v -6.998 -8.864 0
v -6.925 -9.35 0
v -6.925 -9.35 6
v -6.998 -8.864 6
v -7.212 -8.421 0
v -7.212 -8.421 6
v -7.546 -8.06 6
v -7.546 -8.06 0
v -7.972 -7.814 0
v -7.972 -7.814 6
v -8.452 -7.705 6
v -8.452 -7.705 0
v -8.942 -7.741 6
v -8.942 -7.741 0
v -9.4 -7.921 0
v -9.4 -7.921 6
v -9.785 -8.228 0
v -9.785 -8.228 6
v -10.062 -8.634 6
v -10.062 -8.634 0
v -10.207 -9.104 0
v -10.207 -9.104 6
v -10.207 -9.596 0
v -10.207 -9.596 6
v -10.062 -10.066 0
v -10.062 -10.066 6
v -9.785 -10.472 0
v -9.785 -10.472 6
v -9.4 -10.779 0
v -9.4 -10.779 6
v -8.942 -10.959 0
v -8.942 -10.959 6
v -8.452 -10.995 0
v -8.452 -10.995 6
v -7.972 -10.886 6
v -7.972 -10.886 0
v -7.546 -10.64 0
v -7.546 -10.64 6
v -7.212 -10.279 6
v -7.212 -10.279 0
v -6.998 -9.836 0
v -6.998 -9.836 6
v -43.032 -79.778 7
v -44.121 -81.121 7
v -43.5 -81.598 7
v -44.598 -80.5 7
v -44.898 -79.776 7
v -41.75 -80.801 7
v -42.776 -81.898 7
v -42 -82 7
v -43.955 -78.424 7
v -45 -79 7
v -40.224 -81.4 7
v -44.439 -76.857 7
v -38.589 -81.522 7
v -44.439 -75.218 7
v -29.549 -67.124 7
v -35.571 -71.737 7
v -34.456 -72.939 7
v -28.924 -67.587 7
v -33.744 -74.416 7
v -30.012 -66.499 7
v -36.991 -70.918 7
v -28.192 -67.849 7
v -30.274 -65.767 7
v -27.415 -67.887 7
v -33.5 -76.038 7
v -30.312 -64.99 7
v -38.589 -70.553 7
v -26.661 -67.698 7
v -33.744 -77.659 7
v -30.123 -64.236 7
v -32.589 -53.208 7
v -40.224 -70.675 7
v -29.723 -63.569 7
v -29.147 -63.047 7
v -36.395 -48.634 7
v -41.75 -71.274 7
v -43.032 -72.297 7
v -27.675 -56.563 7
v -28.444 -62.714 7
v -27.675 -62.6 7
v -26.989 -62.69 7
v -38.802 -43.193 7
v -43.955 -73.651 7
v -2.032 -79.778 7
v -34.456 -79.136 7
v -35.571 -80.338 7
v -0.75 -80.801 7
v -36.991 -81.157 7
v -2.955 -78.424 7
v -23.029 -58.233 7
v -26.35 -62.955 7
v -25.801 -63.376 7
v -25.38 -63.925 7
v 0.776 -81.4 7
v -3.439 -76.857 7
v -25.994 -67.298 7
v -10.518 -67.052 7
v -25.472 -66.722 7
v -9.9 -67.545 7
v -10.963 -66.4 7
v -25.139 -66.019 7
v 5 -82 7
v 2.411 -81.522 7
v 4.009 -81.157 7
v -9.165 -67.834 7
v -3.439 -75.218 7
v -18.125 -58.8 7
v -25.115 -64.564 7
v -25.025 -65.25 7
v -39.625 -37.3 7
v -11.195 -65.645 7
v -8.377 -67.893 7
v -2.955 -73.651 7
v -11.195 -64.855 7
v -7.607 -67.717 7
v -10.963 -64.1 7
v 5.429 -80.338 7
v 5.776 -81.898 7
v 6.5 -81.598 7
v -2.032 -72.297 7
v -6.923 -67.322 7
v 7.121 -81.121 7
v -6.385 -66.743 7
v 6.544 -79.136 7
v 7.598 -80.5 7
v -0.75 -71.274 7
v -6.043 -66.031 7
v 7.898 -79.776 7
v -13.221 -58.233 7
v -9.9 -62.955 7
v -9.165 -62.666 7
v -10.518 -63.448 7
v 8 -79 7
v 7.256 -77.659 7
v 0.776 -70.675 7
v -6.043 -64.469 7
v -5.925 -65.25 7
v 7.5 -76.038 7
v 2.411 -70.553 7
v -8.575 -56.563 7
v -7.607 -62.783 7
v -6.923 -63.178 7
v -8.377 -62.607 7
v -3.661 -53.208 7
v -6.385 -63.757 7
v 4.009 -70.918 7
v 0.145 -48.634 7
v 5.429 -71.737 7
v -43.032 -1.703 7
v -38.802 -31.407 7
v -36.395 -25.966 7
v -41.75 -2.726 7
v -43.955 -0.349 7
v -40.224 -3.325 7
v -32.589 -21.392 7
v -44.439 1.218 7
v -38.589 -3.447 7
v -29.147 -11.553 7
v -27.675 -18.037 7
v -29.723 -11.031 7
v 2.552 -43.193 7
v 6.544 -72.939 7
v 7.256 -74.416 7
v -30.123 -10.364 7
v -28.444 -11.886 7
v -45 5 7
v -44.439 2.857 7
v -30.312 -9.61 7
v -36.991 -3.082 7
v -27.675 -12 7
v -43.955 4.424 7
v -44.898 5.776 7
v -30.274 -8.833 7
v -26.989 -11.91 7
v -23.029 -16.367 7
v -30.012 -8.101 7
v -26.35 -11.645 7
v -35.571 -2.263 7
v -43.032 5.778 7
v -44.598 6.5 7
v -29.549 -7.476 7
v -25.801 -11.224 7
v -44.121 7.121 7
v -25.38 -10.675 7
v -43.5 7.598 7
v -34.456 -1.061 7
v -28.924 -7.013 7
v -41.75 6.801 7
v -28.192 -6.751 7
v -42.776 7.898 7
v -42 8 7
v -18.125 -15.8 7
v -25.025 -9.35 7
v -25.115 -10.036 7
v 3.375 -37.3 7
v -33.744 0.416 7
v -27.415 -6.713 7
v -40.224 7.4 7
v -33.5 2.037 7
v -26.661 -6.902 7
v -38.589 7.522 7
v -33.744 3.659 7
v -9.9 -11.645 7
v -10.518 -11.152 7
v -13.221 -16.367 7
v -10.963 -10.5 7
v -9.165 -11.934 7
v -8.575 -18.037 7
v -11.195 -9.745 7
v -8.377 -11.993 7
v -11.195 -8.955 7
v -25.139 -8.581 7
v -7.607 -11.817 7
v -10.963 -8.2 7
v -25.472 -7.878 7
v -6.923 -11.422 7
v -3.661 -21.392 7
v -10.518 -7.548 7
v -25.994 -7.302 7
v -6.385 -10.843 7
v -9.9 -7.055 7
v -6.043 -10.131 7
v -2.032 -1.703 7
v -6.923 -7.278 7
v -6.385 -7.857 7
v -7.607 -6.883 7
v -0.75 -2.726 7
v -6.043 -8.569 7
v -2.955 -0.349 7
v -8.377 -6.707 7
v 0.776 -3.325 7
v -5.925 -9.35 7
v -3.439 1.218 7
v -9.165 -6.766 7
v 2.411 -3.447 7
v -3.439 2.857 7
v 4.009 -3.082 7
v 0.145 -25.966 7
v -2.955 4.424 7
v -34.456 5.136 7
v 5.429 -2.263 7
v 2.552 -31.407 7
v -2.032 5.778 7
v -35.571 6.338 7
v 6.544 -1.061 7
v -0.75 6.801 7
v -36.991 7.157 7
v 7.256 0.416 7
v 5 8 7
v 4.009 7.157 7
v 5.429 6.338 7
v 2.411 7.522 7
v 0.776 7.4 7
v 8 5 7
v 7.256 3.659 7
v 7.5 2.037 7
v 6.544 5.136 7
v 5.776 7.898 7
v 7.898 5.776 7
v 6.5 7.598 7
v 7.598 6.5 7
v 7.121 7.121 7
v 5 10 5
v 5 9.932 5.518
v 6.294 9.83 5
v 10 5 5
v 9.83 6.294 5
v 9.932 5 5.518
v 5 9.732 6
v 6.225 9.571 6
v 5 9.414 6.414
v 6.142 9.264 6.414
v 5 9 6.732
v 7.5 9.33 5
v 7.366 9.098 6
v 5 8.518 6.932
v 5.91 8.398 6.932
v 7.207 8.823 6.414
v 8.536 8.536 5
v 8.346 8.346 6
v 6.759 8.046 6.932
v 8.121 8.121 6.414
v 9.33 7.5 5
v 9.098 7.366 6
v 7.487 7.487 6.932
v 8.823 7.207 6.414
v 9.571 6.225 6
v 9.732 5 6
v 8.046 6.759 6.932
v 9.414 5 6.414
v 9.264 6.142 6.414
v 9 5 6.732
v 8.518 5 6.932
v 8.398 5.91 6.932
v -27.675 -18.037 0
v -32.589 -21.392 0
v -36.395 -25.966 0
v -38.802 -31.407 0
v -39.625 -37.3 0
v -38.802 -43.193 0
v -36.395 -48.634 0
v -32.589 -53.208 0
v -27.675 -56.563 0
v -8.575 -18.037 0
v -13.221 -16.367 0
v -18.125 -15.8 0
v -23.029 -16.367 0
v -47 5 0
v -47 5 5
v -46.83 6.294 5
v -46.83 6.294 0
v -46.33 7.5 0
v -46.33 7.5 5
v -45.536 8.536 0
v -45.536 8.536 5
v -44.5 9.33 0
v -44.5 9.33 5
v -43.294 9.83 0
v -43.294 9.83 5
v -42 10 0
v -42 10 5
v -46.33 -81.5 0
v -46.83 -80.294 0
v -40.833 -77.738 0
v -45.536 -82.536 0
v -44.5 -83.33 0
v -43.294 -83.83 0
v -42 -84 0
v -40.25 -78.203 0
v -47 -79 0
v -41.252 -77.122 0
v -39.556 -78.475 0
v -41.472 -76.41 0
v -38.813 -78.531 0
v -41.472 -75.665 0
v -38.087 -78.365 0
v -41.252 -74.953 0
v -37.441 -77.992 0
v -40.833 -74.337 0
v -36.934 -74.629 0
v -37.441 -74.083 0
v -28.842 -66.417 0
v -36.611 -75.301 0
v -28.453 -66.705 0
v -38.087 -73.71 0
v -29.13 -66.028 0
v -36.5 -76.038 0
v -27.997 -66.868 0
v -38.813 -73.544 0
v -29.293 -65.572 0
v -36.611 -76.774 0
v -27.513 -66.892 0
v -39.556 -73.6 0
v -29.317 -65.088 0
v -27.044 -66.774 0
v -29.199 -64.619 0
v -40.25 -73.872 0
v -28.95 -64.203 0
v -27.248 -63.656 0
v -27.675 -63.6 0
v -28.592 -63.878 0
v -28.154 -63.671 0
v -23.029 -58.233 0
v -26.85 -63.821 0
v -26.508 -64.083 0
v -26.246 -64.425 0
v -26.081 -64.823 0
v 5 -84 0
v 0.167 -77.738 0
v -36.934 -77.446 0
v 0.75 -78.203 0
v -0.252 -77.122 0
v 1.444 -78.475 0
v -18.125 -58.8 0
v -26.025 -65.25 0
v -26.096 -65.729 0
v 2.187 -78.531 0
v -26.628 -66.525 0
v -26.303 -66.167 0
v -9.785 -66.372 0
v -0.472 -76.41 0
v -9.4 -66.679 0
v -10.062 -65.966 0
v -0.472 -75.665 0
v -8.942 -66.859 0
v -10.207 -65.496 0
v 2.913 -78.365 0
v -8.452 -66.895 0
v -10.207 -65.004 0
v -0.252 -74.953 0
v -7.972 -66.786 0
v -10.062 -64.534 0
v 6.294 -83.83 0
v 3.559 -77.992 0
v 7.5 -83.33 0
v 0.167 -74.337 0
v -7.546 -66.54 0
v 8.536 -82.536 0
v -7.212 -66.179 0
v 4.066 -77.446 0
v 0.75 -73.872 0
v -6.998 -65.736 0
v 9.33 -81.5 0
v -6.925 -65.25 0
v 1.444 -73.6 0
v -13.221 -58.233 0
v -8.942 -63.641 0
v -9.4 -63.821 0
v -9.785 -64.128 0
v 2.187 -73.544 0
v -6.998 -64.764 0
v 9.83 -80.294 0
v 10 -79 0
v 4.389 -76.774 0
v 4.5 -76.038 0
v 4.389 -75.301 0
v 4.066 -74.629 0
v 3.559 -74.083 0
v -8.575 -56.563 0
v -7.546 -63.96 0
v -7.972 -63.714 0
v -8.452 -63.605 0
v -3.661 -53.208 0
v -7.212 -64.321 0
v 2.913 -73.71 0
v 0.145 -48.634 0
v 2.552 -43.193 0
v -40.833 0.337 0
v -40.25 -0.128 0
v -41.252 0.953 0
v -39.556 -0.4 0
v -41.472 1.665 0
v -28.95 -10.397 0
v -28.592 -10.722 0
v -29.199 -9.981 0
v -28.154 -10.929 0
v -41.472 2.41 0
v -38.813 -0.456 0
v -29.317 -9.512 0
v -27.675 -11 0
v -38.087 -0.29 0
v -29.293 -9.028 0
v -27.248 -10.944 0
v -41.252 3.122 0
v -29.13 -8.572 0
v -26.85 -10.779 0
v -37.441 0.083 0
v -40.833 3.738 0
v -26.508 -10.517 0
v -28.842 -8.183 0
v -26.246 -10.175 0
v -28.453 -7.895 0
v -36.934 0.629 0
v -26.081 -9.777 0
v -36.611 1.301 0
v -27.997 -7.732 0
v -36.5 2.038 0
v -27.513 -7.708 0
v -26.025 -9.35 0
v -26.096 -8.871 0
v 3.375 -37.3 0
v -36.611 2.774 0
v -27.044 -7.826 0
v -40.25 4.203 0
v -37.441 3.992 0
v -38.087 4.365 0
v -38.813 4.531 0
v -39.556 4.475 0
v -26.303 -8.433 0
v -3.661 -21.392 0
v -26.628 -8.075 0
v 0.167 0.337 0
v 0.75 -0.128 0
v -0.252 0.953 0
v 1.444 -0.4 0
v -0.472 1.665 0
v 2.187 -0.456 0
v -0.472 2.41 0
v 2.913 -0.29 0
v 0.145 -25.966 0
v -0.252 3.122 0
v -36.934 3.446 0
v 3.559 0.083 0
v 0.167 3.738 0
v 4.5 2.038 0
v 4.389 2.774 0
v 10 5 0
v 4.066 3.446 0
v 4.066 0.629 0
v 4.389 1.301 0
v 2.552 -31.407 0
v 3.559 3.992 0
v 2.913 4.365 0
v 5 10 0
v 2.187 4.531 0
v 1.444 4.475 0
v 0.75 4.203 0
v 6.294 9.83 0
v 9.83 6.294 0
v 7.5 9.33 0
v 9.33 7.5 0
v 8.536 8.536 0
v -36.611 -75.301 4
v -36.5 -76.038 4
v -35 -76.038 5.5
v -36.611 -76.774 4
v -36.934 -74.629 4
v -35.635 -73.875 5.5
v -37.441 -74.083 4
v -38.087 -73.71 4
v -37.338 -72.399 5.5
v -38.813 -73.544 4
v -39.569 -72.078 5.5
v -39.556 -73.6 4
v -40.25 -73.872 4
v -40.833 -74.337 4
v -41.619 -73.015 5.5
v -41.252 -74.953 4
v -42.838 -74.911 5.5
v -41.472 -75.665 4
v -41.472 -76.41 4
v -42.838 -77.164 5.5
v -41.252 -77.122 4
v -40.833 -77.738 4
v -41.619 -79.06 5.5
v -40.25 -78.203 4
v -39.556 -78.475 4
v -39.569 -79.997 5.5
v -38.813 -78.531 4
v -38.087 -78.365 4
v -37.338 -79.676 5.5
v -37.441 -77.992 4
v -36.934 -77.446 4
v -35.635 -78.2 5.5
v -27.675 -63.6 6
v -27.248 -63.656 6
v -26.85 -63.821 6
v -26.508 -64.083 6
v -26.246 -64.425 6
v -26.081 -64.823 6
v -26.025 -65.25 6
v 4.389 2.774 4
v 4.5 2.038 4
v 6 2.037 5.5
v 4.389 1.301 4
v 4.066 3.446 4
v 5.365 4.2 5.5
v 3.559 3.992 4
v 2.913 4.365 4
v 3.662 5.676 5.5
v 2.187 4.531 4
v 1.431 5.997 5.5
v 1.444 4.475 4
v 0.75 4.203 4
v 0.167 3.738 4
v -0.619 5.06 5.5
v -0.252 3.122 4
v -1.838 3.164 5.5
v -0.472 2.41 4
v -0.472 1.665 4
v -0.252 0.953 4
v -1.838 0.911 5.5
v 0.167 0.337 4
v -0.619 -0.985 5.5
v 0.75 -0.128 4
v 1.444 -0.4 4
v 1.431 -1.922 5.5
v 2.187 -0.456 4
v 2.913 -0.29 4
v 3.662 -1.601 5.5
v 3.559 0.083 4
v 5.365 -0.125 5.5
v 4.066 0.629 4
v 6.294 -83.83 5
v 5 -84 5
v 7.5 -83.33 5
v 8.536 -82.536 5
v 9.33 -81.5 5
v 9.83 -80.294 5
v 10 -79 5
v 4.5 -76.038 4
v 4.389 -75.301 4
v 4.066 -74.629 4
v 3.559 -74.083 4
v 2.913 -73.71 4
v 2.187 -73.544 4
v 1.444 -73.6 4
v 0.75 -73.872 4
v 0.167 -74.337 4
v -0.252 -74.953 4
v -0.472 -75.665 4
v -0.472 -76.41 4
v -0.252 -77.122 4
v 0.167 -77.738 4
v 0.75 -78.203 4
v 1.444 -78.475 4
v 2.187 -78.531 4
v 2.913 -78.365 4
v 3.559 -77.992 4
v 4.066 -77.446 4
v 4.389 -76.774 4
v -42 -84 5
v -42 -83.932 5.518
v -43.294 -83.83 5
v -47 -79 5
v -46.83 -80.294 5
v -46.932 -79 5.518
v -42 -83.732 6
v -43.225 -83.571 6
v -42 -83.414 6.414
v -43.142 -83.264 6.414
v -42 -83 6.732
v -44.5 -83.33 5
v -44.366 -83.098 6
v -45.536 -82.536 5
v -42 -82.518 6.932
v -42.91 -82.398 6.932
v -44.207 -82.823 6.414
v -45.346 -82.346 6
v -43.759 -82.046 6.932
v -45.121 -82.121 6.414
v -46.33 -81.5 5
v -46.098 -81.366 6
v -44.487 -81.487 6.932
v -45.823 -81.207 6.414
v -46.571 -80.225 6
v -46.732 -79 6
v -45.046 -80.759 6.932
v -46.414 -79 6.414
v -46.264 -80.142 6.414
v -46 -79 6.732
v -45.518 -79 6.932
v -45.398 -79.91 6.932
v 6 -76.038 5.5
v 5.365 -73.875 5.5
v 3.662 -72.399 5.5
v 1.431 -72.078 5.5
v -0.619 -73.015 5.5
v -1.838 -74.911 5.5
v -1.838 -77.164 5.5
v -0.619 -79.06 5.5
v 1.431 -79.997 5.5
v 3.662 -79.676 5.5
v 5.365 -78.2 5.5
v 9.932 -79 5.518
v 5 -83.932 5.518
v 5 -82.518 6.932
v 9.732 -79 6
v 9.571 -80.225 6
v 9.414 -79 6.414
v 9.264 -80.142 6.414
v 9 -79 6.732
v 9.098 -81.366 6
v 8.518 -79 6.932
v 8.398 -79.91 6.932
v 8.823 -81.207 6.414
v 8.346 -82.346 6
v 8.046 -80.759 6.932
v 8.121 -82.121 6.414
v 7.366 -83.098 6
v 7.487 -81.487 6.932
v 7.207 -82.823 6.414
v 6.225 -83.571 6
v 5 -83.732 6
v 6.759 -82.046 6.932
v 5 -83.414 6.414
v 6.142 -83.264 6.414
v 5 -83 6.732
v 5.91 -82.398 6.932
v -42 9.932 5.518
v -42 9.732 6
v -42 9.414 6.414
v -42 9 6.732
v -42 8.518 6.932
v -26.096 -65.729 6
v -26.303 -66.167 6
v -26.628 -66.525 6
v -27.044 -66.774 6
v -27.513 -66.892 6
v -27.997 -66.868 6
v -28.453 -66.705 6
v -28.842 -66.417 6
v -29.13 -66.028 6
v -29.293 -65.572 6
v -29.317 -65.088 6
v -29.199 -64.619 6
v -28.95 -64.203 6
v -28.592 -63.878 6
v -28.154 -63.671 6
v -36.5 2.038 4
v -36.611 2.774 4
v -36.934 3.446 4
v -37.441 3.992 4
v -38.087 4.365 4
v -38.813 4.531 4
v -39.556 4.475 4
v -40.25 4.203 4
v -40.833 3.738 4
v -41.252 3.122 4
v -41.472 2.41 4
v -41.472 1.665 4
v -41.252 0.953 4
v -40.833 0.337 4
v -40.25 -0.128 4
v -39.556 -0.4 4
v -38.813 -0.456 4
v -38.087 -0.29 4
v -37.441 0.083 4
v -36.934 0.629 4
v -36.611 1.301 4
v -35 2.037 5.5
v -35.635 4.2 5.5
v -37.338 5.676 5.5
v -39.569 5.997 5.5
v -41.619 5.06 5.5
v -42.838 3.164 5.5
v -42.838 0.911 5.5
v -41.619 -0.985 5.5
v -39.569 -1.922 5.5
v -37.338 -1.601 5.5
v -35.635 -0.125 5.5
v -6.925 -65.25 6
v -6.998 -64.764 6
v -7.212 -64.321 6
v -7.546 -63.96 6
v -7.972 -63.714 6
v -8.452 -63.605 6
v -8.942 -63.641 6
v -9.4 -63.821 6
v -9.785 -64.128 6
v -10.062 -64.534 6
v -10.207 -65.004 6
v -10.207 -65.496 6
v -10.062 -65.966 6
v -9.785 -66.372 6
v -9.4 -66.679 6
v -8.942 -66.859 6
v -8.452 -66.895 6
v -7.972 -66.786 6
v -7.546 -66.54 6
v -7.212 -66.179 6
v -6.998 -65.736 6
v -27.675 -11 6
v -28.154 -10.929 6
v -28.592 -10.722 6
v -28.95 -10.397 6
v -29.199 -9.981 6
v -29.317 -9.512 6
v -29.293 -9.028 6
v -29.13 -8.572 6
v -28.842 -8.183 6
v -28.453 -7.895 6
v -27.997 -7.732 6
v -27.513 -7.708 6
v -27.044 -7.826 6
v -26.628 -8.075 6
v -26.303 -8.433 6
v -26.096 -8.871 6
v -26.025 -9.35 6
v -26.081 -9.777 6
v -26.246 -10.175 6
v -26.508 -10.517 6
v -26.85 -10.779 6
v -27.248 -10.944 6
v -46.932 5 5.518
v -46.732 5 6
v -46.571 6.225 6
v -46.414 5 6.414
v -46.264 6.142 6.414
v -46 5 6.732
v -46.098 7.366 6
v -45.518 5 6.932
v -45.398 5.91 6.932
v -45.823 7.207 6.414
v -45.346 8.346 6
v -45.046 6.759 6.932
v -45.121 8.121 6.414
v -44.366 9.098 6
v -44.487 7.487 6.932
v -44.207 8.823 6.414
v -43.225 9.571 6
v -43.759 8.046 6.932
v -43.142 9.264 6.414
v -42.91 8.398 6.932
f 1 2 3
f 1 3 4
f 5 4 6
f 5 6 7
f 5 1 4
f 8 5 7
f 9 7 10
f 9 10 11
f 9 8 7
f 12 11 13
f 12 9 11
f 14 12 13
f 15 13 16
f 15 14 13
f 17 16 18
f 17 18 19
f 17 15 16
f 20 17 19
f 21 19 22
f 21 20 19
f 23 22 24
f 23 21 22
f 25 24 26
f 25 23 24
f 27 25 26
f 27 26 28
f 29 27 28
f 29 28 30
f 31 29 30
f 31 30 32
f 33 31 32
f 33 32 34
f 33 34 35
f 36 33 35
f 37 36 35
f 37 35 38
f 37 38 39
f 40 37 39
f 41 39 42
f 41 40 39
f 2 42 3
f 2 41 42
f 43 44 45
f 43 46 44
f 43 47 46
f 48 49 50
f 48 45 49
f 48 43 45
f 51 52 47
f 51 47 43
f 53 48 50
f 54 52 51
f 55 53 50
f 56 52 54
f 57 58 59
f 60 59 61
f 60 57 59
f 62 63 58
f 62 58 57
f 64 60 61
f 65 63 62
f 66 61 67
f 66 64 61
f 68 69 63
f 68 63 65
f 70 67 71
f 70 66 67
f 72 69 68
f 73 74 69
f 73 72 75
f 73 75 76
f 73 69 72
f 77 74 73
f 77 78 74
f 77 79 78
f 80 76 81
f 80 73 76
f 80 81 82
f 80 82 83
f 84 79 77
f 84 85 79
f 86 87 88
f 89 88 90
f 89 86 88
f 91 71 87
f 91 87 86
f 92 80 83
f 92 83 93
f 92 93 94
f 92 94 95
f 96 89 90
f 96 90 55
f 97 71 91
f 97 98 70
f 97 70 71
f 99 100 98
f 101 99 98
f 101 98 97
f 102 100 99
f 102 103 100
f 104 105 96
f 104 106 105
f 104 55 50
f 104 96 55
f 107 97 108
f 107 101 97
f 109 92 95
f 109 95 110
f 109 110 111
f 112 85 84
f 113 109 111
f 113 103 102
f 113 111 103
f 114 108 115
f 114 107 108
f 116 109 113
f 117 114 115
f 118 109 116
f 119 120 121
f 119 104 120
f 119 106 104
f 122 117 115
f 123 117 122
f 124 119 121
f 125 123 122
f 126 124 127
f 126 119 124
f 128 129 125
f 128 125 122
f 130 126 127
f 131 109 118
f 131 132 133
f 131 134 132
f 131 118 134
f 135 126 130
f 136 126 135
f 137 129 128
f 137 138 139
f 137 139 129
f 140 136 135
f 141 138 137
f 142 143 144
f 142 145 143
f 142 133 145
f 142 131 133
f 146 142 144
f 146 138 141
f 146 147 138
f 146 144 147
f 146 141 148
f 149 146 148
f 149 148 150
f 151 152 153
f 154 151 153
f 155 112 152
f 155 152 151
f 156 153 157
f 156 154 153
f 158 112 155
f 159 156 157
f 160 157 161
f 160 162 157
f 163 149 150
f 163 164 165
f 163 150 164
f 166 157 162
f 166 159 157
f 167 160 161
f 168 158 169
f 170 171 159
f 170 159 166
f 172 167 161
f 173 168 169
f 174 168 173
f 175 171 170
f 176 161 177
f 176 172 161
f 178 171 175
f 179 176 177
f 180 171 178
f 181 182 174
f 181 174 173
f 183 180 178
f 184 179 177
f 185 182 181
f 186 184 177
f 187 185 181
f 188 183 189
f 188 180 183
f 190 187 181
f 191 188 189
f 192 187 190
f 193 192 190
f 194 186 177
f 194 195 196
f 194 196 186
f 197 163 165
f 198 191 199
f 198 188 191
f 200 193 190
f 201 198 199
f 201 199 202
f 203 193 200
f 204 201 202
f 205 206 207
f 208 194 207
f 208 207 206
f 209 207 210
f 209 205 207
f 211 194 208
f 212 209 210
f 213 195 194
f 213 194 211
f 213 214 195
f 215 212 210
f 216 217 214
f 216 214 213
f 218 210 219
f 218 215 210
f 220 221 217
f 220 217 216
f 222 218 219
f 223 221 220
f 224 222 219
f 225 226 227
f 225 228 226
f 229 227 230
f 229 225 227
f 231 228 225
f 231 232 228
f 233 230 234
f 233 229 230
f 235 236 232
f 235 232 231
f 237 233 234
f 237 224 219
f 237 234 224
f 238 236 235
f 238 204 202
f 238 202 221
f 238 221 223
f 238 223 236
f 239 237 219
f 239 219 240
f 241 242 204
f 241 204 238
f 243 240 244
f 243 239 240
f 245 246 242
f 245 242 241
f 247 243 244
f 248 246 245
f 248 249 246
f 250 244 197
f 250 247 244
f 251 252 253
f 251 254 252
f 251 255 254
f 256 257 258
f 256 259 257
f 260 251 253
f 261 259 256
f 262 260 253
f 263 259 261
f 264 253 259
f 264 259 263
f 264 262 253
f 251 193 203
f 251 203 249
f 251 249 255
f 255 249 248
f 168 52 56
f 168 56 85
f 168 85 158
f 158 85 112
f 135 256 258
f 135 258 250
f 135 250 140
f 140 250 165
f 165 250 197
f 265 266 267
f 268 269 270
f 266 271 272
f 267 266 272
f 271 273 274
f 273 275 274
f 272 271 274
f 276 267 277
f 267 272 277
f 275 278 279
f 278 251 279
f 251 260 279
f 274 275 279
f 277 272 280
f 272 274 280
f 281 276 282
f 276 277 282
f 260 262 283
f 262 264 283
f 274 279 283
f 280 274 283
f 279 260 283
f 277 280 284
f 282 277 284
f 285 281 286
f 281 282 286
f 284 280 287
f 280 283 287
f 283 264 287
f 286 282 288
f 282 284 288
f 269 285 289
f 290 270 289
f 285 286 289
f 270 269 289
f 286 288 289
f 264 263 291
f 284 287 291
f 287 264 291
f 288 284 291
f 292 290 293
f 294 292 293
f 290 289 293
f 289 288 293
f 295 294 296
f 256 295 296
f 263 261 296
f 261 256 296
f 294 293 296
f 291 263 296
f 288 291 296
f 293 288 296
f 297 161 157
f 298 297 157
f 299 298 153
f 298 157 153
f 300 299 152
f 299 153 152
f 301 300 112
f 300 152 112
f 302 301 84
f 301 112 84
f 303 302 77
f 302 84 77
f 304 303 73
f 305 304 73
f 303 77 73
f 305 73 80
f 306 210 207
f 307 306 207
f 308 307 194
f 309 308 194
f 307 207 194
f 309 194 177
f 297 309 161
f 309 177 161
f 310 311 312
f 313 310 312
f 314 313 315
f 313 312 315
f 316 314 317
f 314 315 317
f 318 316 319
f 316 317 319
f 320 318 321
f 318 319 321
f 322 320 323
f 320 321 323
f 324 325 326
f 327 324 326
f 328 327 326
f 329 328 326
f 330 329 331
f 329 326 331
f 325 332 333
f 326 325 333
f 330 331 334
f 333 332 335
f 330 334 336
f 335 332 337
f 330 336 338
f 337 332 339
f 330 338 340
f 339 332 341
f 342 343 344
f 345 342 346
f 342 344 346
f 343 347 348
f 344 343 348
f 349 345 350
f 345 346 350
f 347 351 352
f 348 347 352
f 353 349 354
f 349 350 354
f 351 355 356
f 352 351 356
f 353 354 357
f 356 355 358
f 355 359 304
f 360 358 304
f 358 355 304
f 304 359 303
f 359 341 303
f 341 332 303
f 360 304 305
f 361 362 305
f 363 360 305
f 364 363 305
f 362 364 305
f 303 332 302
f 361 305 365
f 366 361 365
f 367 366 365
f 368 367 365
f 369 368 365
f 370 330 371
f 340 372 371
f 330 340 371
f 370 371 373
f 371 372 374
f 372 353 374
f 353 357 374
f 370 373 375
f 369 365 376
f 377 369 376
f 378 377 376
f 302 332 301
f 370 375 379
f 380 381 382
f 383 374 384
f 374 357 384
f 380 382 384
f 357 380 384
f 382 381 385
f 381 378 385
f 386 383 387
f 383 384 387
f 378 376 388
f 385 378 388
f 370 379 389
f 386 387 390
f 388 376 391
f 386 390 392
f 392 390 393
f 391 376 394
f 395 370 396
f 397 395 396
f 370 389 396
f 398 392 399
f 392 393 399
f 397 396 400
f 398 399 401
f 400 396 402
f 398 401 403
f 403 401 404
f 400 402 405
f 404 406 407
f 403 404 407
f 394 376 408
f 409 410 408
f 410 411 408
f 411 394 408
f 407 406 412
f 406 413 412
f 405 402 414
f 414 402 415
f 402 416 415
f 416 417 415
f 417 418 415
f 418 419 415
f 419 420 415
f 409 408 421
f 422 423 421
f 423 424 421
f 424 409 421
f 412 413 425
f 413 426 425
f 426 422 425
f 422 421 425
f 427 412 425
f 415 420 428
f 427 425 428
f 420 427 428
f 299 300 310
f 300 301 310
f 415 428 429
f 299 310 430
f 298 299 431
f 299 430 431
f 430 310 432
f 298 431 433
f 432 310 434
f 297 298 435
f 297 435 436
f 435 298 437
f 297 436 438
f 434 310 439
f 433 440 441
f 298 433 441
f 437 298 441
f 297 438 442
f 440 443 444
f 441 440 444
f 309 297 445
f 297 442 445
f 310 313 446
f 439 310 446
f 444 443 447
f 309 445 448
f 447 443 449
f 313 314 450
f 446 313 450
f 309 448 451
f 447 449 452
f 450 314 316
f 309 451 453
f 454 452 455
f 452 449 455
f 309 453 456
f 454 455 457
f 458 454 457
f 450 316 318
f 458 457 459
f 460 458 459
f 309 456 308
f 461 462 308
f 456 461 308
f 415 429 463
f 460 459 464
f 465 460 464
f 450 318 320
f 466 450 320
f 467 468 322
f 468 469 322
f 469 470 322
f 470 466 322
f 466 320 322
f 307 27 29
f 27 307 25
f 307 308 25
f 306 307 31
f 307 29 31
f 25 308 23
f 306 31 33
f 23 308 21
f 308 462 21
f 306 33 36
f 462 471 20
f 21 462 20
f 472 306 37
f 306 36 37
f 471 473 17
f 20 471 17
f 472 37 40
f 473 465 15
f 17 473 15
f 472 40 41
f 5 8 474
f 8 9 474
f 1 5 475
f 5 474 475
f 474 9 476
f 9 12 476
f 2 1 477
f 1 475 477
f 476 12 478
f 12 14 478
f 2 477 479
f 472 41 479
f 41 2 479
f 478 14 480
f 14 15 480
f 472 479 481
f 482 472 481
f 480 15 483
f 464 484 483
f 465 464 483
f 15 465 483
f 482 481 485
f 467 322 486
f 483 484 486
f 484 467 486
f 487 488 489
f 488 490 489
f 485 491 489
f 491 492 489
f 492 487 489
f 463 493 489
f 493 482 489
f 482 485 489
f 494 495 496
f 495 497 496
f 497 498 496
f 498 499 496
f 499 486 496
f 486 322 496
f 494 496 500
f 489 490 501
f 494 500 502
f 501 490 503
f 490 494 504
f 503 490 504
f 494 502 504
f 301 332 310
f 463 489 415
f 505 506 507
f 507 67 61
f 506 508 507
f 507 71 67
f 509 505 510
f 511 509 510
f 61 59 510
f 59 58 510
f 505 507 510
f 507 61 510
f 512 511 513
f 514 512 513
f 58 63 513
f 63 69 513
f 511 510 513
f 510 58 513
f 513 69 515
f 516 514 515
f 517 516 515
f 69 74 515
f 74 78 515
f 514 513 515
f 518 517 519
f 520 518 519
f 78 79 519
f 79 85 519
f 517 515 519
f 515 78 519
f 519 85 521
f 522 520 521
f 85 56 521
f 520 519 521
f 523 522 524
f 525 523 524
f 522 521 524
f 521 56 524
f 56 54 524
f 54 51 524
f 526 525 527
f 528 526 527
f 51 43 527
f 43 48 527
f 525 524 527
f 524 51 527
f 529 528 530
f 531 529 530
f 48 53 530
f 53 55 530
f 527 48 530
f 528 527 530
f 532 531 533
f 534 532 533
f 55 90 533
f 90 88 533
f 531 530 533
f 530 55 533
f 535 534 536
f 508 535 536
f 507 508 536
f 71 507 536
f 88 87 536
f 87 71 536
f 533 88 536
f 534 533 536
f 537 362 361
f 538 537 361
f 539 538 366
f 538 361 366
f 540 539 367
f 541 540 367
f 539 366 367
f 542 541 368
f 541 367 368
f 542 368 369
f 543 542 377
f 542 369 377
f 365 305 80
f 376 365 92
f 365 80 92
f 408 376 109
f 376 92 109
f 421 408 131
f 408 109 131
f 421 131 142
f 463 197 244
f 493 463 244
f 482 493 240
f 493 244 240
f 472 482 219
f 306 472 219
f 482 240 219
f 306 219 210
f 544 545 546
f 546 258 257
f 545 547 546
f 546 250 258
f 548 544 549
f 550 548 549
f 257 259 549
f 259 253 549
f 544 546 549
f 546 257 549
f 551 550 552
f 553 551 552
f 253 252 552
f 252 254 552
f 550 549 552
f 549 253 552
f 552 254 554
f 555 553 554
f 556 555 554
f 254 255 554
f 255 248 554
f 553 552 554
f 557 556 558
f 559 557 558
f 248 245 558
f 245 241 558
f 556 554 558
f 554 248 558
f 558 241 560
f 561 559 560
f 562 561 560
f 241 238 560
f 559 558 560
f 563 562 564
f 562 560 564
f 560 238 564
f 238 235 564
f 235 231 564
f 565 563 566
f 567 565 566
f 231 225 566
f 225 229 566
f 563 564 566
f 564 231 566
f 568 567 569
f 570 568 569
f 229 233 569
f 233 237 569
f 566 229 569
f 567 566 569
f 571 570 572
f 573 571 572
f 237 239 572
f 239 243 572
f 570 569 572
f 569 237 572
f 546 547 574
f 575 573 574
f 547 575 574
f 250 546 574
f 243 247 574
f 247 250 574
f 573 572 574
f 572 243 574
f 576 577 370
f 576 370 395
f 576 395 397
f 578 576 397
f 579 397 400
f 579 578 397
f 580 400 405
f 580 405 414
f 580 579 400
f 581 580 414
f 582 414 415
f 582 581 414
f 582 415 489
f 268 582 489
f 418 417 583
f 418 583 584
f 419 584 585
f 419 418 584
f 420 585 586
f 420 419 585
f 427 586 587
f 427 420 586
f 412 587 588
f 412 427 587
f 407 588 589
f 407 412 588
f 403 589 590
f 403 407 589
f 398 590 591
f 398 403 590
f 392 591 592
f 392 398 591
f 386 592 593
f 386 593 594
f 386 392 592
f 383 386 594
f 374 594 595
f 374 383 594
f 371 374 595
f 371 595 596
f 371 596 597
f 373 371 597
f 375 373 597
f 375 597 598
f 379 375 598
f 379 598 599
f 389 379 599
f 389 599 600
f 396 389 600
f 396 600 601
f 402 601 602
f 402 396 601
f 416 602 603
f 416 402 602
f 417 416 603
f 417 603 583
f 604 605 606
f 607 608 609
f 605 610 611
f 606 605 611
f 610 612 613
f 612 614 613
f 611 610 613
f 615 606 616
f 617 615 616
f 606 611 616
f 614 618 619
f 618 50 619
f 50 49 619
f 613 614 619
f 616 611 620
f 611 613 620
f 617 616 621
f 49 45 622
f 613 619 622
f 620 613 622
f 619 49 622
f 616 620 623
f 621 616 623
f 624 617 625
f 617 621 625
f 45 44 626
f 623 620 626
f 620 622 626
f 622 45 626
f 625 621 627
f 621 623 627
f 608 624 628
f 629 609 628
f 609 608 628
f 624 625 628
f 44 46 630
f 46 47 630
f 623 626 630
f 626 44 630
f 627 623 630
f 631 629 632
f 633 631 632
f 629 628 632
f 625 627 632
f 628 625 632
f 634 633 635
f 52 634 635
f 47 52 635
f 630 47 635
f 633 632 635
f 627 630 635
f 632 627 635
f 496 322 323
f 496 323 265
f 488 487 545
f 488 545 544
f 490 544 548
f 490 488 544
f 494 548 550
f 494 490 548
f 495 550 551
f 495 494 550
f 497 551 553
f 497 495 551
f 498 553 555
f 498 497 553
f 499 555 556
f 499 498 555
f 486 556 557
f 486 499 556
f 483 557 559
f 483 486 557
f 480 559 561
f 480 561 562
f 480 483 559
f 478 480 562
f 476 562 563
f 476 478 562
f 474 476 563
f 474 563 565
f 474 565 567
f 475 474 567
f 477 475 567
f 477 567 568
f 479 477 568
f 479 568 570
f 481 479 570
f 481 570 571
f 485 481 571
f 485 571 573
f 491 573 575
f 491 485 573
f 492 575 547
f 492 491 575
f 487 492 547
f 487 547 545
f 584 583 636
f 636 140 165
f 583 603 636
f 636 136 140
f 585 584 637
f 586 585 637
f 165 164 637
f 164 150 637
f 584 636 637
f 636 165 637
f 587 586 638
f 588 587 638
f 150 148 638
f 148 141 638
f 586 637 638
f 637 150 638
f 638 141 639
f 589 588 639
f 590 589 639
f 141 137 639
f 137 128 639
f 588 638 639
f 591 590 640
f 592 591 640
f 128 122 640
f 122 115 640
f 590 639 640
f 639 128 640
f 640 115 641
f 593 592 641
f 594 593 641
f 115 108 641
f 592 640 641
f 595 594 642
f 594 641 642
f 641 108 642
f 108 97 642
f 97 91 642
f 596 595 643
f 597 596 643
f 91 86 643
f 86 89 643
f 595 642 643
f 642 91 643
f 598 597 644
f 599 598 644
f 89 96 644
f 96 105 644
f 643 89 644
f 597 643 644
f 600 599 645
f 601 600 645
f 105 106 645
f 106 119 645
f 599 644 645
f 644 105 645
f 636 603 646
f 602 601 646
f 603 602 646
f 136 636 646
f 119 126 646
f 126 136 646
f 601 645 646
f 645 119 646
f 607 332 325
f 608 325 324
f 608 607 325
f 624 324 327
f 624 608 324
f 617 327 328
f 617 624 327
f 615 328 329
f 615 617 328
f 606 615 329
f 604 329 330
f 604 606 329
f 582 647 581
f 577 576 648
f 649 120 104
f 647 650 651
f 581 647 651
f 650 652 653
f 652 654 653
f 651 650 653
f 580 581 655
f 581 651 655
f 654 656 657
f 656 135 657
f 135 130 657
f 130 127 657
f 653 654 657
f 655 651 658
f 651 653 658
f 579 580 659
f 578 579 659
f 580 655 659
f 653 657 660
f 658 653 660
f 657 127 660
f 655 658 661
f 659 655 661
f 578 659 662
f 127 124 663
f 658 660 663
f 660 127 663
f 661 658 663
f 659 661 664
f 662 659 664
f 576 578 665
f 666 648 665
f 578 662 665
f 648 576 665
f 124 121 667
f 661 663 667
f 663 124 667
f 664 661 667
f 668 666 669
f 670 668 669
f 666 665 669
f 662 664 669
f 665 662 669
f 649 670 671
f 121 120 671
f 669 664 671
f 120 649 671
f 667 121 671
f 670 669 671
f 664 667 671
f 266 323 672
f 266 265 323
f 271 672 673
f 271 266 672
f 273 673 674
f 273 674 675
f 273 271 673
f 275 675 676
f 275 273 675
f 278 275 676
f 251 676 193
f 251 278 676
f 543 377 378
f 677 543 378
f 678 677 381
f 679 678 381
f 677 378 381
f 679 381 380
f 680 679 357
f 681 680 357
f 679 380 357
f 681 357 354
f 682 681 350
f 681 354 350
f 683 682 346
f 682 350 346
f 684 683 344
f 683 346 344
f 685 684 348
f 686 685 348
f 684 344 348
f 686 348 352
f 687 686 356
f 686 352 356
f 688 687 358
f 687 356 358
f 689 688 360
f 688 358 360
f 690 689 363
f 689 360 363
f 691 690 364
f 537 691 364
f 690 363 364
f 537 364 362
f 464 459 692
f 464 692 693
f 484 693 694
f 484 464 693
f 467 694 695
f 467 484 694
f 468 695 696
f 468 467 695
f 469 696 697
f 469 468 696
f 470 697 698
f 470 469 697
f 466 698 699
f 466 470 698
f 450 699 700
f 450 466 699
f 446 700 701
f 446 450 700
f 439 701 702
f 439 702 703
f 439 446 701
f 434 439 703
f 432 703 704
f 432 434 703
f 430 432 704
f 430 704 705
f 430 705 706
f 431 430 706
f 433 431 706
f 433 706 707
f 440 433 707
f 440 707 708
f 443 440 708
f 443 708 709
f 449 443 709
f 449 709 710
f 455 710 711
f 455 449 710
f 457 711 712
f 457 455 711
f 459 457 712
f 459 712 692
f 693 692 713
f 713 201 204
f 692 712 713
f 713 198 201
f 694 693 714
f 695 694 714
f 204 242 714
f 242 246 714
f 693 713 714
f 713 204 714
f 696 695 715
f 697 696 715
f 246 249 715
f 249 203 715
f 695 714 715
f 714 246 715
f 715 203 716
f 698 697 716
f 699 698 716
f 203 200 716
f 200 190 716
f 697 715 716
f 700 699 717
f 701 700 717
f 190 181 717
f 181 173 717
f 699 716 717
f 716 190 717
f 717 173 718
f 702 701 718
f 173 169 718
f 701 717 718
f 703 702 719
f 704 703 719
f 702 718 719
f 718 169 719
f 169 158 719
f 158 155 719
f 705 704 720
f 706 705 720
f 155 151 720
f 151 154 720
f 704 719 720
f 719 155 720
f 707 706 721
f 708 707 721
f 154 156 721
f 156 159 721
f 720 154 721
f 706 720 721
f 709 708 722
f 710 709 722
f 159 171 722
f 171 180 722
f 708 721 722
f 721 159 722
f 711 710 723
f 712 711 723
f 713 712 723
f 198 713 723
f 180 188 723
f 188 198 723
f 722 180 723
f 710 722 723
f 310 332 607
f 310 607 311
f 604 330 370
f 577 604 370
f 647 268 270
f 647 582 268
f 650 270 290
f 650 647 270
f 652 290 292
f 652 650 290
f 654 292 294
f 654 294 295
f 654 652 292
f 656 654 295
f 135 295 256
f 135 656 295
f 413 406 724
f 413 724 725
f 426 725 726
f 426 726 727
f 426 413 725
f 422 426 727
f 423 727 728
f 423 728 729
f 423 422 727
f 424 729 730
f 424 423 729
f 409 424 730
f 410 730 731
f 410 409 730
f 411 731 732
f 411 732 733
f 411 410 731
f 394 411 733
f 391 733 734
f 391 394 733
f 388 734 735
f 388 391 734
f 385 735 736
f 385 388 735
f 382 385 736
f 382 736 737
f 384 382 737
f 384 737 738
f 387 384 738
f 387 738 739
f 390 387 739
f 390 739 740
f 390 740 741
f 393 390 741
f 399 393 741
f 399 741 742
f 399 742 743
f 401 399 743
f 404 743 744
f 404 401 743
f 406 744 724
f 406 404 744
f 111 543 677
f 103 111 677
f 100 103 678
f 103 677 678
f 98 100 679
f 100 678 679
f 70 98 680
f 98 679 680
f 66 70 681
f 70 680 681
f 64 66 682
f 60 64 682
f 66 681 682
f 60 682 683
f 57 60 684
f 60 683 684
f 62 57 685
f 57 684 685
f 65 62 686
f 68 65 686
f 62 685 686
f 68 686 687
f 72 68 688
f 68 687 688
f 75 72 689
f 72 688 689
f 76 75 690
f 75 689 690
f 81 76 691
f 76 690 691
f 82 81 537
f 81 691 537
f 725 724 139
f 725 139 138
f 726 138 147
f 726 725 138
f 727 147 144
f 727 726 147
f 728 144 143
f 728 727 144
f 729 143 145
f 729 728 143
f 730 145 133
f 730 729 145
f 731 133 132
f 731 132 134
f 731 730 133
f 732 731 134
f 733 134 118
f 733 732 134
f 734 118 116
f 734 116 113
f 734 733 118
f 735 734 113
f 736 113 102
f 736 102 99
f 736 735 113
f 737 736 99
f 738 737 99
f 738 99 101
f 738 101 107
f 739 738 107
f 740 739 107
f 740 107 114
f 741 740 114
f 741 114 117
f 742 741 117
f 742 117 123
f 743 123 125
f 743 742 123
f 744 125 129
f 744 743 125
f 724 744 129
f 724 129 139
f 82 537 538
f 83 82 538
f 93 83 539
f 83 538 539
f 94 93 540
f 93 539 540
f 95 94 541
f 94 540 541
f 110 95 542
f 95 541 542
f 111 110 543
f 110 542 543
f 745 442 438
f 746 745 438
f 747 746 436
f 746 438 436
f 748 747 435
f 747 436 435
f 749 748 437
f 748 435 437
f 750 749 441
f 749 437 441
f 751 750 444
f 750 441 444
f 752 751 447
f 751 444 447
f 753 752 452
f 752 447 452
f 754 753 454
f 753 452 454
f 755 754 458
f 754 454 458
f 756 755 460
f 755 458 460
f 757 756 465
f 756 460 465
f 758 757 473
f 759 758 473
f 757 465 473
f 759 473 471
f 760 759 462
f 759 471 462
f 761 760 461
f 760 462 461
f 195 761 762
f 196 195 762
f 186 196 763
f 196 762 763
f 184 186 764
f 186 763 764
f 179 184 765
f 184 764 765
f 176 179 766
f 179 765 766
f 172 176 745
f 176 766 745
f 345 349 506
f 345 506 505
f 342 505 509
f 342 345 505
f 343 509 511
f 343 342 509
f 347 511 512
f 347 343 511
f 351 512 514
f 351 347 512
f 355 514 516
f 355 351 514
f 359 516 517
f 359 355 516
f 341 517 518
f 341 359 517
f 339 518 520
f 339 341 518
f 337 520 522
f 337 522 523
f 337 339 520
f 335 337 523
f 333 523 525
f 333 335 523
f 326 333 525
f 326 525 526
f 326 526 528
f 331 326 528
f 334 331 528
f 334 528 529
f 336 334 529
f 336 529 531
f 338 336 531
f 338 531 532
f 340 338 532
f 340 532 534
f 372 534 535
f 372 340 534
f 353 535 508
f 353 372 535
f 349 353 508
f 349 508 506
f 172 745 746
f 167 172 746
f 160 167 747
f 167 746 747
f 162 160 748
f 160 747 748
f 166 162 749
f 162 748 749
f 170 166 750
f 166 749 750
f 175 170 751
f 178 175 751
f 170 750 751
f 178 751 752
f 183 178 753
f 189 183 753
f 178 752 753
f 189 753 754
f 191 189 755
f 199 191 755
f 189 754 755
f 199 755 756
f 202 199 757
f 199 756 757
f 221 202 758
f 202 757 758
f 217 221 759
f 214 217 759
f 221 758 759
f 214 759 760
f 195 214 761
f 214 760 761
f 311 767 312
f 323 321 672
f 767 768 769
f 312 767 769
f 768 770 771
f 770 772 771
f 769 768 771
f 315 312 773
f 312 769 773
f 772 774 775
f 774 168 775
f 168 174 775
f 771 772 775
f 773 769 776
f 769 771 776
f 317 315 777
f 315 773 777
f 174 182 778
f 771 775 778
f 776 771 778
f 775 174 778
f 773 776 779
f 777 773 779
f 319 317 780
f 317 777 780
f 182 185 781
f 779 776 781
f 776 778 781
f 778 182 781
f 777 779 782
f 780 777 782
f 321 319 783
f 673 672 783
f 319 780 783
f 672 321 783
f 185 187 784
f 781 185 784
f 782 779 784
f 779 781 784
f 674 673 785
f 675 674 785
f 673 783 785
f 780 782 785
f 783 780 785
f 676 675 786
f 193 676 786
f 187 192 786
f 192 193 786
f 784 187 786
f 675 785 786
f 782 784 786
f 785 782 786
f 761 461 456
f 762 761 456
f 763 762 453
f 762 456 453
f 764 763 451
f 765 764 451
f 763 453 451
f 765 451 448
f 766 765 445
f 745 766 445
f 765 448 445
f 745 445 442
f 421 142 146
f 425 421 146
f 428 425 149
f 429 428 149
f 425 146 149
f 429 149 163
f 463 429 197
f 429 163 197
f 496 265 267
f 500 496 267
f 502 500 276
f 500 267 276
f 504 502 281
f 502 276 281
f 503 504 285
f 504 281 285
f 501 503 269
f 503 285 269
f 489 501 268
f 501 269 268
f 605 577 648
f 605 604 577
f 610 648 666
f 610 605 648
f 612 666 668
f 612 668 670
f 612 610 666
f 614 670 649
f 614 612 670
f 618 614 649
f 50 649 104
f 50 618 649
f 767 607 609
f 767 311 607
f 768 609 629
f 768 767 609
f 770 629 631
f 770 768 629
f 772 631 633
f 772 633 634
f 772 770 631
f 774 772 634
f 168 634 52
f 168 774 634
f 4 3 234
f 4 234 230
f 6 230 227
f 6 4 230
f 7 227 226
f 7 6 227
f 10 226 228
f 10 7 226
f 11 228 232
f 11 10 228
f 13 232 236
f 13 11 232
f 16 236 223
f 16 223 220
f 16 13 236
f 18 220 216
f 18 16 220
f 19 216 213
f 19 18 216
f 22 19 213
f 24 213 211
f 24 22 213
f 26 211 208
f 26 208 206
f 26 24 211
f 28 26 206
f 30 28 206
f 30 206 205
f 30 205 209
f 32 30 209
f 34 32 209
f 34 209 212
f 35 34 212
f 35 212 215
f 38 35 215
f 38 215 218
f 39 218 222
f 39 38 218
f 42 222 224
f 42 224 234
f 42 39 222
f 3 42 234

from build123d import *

# Parameters (mm, degrees)
SKETCH1_W           = 57
SKETCH1_H           = 94
SKETCH1_R           = 2.5
SKETCH1_R_2         = 1.65
BOSS_EXTRUDE1_DEPTH = 7
CHAMFER1_SIZE       = 3
FILLET1_R           = 5
FILLET2_R           = 2
CHAMFER2_SIZE       = 1
CUT_EXTRUDE1_DEPTH  = 10


with BuildPart() as part:
    # Sketch1 → Boss-Extrude1 (new body)
    with BuildSketch(Plane.XY):
        with Locations((-18.5, -37)):
            Rectangle(SKETCH1_W, SKETCH1_H)
        with Locations((-39, -76.0375)):
            Circle(SKETCH1_R, mode=Mode.SUBTRACT)
        with BuildLine():
            ThreePointArc((-26.025, -65.25), (-28.841726189, -66.416726189), (-27.675, -63.6))
            ThreePointArc((-27.675, -63.6), (-26.508273811, -64.083273811), (-26.025, -65.25))
        make_face(mode=Mode.SUBTRACT)
        with Locations((-8.575, -65.25)):
            Circle(SKETCH1_R_2, mode=Mode.SUBTRACT)
        with Locations((2, -76.0375)):
            Circle(SKETCH1_R, mode=Mode.SUBTRACT)
        with BuildLine():
            ThreePointArc((-26.025, -9.35), (-26.508273811, -10.516726189), (-27.675, -11))
            ThreePointArc((-27.675, -11), (-28.841726189, -8.183273811), (-26.025, -9.35))
        make_face(mode=Mode.SUBTRACT)
        with Locations((-8.575, -9.35)):
            Circle(SKETCH1_R_2, mode=Mode.SUBTRACT)
        with Locations((2, 2.0375)):
            Circle(SKETCH1_R, mode=Mode.SUBTRACT)
        with Locations((-39, 2.0375)):
            Circle(SKETCH1_R, mode=Mode.SUBTRACT)
    extrude(amount=BOSS_EXTRUDE1_DEPTH)

    # Chamfer1
    chamfer1_edges = [part.edges().sort_by_distance(p)[0] for p in [
        (-0.5, -76.0375, 7),
        (-41.5, -76.0375, 7),
        (-0.5, 2.0375, 7),
        (-41.5, 2.0375, 7),
    ]]
    chamfer(chamfer1_edges, length=CHAMFER1_SIZE)

    # Fillet1
    fillet1_edges = [part.edges().sort_by_distance(p)[0] for p in [
        (10, 10, 3.5),
        (10, -84, 3.5),
        (-47, -84, 3.5),
        (-47, 10, 3.5),
    ]]
    fillet(fillet1_edges, radius=FILLET1_R)

    # Fillet2
    fillet2_edges = [part.edges().sort_by_distance(p)[0] for p in [
        (-18.5, 10, 7),
        (10, -37, 7),
        (-47, -37, 7),
        (-18.5, -84, 7),
        (8.535533906, -82.535533906, 7),
        (-45.535533906, -82.535533906, 7),
        (-45.535533906, 8.535533906, 7),
        (8.535533906, 8.535533906, 7),
    ]]
    fillet(fillet2_edges, radius=FILLET2_R)

    # Chamfer2
    chamfer2_edges = [part.edges().sort_by_distance(p)[0] for p in [
        (-29.325, -9.35, 7),
        (-10.225, -65.25, 7),
        (-27.675, -66.9, 7),
        (-10.225, -9.35, 7),
    ]]
    chamfer(chamfer2_edges, length=CHAMFER2_SIZE)

    # Sketch3 → Cut-Extrude1 (cut)
    with BuildSketch(Plane.XY.offset(7)):
        with BuildLine():
            Line((-27.675, -56.562593283), (-27.675, -18.037406717))
            ThreePointArc((-27.675, -18.037406717), (-39.625, -37.3), (-27.675, -56.562593283))
        make_face()
        with BuildLine():
            ThreePointArc((-8.575, -18.037406717), (-18.125, -15.8), (-27.675, -18.037406717))
            Line((-27.675, -18.037406717), (-27.675, -56.562593283))
            ThreePointArc((-27.675, -56.562593283), (-18.125, -58.8), (-8.575, -56.562593283))
            Line((-8.575, -56.562593283), (-8.575, -18.037406717))
        make_face()
        with BuildLine():
            ThreePointArc((3.375, -37.3), (0.144852216, -25.965870126), (-8.575, -18.037406717))
            Line((-8.575, -18.037406717), (-8.575, -56.562593283))
            ThreePointArc((-8.575, -56.562593283), (0.144852216, -48.634129874), (3.375, -37.3))
        make_face()
    extrude(amount=-CUT_EXTRUDE1_DEPTH, mode=Mode.SUBTRACT)


solid = part.part
